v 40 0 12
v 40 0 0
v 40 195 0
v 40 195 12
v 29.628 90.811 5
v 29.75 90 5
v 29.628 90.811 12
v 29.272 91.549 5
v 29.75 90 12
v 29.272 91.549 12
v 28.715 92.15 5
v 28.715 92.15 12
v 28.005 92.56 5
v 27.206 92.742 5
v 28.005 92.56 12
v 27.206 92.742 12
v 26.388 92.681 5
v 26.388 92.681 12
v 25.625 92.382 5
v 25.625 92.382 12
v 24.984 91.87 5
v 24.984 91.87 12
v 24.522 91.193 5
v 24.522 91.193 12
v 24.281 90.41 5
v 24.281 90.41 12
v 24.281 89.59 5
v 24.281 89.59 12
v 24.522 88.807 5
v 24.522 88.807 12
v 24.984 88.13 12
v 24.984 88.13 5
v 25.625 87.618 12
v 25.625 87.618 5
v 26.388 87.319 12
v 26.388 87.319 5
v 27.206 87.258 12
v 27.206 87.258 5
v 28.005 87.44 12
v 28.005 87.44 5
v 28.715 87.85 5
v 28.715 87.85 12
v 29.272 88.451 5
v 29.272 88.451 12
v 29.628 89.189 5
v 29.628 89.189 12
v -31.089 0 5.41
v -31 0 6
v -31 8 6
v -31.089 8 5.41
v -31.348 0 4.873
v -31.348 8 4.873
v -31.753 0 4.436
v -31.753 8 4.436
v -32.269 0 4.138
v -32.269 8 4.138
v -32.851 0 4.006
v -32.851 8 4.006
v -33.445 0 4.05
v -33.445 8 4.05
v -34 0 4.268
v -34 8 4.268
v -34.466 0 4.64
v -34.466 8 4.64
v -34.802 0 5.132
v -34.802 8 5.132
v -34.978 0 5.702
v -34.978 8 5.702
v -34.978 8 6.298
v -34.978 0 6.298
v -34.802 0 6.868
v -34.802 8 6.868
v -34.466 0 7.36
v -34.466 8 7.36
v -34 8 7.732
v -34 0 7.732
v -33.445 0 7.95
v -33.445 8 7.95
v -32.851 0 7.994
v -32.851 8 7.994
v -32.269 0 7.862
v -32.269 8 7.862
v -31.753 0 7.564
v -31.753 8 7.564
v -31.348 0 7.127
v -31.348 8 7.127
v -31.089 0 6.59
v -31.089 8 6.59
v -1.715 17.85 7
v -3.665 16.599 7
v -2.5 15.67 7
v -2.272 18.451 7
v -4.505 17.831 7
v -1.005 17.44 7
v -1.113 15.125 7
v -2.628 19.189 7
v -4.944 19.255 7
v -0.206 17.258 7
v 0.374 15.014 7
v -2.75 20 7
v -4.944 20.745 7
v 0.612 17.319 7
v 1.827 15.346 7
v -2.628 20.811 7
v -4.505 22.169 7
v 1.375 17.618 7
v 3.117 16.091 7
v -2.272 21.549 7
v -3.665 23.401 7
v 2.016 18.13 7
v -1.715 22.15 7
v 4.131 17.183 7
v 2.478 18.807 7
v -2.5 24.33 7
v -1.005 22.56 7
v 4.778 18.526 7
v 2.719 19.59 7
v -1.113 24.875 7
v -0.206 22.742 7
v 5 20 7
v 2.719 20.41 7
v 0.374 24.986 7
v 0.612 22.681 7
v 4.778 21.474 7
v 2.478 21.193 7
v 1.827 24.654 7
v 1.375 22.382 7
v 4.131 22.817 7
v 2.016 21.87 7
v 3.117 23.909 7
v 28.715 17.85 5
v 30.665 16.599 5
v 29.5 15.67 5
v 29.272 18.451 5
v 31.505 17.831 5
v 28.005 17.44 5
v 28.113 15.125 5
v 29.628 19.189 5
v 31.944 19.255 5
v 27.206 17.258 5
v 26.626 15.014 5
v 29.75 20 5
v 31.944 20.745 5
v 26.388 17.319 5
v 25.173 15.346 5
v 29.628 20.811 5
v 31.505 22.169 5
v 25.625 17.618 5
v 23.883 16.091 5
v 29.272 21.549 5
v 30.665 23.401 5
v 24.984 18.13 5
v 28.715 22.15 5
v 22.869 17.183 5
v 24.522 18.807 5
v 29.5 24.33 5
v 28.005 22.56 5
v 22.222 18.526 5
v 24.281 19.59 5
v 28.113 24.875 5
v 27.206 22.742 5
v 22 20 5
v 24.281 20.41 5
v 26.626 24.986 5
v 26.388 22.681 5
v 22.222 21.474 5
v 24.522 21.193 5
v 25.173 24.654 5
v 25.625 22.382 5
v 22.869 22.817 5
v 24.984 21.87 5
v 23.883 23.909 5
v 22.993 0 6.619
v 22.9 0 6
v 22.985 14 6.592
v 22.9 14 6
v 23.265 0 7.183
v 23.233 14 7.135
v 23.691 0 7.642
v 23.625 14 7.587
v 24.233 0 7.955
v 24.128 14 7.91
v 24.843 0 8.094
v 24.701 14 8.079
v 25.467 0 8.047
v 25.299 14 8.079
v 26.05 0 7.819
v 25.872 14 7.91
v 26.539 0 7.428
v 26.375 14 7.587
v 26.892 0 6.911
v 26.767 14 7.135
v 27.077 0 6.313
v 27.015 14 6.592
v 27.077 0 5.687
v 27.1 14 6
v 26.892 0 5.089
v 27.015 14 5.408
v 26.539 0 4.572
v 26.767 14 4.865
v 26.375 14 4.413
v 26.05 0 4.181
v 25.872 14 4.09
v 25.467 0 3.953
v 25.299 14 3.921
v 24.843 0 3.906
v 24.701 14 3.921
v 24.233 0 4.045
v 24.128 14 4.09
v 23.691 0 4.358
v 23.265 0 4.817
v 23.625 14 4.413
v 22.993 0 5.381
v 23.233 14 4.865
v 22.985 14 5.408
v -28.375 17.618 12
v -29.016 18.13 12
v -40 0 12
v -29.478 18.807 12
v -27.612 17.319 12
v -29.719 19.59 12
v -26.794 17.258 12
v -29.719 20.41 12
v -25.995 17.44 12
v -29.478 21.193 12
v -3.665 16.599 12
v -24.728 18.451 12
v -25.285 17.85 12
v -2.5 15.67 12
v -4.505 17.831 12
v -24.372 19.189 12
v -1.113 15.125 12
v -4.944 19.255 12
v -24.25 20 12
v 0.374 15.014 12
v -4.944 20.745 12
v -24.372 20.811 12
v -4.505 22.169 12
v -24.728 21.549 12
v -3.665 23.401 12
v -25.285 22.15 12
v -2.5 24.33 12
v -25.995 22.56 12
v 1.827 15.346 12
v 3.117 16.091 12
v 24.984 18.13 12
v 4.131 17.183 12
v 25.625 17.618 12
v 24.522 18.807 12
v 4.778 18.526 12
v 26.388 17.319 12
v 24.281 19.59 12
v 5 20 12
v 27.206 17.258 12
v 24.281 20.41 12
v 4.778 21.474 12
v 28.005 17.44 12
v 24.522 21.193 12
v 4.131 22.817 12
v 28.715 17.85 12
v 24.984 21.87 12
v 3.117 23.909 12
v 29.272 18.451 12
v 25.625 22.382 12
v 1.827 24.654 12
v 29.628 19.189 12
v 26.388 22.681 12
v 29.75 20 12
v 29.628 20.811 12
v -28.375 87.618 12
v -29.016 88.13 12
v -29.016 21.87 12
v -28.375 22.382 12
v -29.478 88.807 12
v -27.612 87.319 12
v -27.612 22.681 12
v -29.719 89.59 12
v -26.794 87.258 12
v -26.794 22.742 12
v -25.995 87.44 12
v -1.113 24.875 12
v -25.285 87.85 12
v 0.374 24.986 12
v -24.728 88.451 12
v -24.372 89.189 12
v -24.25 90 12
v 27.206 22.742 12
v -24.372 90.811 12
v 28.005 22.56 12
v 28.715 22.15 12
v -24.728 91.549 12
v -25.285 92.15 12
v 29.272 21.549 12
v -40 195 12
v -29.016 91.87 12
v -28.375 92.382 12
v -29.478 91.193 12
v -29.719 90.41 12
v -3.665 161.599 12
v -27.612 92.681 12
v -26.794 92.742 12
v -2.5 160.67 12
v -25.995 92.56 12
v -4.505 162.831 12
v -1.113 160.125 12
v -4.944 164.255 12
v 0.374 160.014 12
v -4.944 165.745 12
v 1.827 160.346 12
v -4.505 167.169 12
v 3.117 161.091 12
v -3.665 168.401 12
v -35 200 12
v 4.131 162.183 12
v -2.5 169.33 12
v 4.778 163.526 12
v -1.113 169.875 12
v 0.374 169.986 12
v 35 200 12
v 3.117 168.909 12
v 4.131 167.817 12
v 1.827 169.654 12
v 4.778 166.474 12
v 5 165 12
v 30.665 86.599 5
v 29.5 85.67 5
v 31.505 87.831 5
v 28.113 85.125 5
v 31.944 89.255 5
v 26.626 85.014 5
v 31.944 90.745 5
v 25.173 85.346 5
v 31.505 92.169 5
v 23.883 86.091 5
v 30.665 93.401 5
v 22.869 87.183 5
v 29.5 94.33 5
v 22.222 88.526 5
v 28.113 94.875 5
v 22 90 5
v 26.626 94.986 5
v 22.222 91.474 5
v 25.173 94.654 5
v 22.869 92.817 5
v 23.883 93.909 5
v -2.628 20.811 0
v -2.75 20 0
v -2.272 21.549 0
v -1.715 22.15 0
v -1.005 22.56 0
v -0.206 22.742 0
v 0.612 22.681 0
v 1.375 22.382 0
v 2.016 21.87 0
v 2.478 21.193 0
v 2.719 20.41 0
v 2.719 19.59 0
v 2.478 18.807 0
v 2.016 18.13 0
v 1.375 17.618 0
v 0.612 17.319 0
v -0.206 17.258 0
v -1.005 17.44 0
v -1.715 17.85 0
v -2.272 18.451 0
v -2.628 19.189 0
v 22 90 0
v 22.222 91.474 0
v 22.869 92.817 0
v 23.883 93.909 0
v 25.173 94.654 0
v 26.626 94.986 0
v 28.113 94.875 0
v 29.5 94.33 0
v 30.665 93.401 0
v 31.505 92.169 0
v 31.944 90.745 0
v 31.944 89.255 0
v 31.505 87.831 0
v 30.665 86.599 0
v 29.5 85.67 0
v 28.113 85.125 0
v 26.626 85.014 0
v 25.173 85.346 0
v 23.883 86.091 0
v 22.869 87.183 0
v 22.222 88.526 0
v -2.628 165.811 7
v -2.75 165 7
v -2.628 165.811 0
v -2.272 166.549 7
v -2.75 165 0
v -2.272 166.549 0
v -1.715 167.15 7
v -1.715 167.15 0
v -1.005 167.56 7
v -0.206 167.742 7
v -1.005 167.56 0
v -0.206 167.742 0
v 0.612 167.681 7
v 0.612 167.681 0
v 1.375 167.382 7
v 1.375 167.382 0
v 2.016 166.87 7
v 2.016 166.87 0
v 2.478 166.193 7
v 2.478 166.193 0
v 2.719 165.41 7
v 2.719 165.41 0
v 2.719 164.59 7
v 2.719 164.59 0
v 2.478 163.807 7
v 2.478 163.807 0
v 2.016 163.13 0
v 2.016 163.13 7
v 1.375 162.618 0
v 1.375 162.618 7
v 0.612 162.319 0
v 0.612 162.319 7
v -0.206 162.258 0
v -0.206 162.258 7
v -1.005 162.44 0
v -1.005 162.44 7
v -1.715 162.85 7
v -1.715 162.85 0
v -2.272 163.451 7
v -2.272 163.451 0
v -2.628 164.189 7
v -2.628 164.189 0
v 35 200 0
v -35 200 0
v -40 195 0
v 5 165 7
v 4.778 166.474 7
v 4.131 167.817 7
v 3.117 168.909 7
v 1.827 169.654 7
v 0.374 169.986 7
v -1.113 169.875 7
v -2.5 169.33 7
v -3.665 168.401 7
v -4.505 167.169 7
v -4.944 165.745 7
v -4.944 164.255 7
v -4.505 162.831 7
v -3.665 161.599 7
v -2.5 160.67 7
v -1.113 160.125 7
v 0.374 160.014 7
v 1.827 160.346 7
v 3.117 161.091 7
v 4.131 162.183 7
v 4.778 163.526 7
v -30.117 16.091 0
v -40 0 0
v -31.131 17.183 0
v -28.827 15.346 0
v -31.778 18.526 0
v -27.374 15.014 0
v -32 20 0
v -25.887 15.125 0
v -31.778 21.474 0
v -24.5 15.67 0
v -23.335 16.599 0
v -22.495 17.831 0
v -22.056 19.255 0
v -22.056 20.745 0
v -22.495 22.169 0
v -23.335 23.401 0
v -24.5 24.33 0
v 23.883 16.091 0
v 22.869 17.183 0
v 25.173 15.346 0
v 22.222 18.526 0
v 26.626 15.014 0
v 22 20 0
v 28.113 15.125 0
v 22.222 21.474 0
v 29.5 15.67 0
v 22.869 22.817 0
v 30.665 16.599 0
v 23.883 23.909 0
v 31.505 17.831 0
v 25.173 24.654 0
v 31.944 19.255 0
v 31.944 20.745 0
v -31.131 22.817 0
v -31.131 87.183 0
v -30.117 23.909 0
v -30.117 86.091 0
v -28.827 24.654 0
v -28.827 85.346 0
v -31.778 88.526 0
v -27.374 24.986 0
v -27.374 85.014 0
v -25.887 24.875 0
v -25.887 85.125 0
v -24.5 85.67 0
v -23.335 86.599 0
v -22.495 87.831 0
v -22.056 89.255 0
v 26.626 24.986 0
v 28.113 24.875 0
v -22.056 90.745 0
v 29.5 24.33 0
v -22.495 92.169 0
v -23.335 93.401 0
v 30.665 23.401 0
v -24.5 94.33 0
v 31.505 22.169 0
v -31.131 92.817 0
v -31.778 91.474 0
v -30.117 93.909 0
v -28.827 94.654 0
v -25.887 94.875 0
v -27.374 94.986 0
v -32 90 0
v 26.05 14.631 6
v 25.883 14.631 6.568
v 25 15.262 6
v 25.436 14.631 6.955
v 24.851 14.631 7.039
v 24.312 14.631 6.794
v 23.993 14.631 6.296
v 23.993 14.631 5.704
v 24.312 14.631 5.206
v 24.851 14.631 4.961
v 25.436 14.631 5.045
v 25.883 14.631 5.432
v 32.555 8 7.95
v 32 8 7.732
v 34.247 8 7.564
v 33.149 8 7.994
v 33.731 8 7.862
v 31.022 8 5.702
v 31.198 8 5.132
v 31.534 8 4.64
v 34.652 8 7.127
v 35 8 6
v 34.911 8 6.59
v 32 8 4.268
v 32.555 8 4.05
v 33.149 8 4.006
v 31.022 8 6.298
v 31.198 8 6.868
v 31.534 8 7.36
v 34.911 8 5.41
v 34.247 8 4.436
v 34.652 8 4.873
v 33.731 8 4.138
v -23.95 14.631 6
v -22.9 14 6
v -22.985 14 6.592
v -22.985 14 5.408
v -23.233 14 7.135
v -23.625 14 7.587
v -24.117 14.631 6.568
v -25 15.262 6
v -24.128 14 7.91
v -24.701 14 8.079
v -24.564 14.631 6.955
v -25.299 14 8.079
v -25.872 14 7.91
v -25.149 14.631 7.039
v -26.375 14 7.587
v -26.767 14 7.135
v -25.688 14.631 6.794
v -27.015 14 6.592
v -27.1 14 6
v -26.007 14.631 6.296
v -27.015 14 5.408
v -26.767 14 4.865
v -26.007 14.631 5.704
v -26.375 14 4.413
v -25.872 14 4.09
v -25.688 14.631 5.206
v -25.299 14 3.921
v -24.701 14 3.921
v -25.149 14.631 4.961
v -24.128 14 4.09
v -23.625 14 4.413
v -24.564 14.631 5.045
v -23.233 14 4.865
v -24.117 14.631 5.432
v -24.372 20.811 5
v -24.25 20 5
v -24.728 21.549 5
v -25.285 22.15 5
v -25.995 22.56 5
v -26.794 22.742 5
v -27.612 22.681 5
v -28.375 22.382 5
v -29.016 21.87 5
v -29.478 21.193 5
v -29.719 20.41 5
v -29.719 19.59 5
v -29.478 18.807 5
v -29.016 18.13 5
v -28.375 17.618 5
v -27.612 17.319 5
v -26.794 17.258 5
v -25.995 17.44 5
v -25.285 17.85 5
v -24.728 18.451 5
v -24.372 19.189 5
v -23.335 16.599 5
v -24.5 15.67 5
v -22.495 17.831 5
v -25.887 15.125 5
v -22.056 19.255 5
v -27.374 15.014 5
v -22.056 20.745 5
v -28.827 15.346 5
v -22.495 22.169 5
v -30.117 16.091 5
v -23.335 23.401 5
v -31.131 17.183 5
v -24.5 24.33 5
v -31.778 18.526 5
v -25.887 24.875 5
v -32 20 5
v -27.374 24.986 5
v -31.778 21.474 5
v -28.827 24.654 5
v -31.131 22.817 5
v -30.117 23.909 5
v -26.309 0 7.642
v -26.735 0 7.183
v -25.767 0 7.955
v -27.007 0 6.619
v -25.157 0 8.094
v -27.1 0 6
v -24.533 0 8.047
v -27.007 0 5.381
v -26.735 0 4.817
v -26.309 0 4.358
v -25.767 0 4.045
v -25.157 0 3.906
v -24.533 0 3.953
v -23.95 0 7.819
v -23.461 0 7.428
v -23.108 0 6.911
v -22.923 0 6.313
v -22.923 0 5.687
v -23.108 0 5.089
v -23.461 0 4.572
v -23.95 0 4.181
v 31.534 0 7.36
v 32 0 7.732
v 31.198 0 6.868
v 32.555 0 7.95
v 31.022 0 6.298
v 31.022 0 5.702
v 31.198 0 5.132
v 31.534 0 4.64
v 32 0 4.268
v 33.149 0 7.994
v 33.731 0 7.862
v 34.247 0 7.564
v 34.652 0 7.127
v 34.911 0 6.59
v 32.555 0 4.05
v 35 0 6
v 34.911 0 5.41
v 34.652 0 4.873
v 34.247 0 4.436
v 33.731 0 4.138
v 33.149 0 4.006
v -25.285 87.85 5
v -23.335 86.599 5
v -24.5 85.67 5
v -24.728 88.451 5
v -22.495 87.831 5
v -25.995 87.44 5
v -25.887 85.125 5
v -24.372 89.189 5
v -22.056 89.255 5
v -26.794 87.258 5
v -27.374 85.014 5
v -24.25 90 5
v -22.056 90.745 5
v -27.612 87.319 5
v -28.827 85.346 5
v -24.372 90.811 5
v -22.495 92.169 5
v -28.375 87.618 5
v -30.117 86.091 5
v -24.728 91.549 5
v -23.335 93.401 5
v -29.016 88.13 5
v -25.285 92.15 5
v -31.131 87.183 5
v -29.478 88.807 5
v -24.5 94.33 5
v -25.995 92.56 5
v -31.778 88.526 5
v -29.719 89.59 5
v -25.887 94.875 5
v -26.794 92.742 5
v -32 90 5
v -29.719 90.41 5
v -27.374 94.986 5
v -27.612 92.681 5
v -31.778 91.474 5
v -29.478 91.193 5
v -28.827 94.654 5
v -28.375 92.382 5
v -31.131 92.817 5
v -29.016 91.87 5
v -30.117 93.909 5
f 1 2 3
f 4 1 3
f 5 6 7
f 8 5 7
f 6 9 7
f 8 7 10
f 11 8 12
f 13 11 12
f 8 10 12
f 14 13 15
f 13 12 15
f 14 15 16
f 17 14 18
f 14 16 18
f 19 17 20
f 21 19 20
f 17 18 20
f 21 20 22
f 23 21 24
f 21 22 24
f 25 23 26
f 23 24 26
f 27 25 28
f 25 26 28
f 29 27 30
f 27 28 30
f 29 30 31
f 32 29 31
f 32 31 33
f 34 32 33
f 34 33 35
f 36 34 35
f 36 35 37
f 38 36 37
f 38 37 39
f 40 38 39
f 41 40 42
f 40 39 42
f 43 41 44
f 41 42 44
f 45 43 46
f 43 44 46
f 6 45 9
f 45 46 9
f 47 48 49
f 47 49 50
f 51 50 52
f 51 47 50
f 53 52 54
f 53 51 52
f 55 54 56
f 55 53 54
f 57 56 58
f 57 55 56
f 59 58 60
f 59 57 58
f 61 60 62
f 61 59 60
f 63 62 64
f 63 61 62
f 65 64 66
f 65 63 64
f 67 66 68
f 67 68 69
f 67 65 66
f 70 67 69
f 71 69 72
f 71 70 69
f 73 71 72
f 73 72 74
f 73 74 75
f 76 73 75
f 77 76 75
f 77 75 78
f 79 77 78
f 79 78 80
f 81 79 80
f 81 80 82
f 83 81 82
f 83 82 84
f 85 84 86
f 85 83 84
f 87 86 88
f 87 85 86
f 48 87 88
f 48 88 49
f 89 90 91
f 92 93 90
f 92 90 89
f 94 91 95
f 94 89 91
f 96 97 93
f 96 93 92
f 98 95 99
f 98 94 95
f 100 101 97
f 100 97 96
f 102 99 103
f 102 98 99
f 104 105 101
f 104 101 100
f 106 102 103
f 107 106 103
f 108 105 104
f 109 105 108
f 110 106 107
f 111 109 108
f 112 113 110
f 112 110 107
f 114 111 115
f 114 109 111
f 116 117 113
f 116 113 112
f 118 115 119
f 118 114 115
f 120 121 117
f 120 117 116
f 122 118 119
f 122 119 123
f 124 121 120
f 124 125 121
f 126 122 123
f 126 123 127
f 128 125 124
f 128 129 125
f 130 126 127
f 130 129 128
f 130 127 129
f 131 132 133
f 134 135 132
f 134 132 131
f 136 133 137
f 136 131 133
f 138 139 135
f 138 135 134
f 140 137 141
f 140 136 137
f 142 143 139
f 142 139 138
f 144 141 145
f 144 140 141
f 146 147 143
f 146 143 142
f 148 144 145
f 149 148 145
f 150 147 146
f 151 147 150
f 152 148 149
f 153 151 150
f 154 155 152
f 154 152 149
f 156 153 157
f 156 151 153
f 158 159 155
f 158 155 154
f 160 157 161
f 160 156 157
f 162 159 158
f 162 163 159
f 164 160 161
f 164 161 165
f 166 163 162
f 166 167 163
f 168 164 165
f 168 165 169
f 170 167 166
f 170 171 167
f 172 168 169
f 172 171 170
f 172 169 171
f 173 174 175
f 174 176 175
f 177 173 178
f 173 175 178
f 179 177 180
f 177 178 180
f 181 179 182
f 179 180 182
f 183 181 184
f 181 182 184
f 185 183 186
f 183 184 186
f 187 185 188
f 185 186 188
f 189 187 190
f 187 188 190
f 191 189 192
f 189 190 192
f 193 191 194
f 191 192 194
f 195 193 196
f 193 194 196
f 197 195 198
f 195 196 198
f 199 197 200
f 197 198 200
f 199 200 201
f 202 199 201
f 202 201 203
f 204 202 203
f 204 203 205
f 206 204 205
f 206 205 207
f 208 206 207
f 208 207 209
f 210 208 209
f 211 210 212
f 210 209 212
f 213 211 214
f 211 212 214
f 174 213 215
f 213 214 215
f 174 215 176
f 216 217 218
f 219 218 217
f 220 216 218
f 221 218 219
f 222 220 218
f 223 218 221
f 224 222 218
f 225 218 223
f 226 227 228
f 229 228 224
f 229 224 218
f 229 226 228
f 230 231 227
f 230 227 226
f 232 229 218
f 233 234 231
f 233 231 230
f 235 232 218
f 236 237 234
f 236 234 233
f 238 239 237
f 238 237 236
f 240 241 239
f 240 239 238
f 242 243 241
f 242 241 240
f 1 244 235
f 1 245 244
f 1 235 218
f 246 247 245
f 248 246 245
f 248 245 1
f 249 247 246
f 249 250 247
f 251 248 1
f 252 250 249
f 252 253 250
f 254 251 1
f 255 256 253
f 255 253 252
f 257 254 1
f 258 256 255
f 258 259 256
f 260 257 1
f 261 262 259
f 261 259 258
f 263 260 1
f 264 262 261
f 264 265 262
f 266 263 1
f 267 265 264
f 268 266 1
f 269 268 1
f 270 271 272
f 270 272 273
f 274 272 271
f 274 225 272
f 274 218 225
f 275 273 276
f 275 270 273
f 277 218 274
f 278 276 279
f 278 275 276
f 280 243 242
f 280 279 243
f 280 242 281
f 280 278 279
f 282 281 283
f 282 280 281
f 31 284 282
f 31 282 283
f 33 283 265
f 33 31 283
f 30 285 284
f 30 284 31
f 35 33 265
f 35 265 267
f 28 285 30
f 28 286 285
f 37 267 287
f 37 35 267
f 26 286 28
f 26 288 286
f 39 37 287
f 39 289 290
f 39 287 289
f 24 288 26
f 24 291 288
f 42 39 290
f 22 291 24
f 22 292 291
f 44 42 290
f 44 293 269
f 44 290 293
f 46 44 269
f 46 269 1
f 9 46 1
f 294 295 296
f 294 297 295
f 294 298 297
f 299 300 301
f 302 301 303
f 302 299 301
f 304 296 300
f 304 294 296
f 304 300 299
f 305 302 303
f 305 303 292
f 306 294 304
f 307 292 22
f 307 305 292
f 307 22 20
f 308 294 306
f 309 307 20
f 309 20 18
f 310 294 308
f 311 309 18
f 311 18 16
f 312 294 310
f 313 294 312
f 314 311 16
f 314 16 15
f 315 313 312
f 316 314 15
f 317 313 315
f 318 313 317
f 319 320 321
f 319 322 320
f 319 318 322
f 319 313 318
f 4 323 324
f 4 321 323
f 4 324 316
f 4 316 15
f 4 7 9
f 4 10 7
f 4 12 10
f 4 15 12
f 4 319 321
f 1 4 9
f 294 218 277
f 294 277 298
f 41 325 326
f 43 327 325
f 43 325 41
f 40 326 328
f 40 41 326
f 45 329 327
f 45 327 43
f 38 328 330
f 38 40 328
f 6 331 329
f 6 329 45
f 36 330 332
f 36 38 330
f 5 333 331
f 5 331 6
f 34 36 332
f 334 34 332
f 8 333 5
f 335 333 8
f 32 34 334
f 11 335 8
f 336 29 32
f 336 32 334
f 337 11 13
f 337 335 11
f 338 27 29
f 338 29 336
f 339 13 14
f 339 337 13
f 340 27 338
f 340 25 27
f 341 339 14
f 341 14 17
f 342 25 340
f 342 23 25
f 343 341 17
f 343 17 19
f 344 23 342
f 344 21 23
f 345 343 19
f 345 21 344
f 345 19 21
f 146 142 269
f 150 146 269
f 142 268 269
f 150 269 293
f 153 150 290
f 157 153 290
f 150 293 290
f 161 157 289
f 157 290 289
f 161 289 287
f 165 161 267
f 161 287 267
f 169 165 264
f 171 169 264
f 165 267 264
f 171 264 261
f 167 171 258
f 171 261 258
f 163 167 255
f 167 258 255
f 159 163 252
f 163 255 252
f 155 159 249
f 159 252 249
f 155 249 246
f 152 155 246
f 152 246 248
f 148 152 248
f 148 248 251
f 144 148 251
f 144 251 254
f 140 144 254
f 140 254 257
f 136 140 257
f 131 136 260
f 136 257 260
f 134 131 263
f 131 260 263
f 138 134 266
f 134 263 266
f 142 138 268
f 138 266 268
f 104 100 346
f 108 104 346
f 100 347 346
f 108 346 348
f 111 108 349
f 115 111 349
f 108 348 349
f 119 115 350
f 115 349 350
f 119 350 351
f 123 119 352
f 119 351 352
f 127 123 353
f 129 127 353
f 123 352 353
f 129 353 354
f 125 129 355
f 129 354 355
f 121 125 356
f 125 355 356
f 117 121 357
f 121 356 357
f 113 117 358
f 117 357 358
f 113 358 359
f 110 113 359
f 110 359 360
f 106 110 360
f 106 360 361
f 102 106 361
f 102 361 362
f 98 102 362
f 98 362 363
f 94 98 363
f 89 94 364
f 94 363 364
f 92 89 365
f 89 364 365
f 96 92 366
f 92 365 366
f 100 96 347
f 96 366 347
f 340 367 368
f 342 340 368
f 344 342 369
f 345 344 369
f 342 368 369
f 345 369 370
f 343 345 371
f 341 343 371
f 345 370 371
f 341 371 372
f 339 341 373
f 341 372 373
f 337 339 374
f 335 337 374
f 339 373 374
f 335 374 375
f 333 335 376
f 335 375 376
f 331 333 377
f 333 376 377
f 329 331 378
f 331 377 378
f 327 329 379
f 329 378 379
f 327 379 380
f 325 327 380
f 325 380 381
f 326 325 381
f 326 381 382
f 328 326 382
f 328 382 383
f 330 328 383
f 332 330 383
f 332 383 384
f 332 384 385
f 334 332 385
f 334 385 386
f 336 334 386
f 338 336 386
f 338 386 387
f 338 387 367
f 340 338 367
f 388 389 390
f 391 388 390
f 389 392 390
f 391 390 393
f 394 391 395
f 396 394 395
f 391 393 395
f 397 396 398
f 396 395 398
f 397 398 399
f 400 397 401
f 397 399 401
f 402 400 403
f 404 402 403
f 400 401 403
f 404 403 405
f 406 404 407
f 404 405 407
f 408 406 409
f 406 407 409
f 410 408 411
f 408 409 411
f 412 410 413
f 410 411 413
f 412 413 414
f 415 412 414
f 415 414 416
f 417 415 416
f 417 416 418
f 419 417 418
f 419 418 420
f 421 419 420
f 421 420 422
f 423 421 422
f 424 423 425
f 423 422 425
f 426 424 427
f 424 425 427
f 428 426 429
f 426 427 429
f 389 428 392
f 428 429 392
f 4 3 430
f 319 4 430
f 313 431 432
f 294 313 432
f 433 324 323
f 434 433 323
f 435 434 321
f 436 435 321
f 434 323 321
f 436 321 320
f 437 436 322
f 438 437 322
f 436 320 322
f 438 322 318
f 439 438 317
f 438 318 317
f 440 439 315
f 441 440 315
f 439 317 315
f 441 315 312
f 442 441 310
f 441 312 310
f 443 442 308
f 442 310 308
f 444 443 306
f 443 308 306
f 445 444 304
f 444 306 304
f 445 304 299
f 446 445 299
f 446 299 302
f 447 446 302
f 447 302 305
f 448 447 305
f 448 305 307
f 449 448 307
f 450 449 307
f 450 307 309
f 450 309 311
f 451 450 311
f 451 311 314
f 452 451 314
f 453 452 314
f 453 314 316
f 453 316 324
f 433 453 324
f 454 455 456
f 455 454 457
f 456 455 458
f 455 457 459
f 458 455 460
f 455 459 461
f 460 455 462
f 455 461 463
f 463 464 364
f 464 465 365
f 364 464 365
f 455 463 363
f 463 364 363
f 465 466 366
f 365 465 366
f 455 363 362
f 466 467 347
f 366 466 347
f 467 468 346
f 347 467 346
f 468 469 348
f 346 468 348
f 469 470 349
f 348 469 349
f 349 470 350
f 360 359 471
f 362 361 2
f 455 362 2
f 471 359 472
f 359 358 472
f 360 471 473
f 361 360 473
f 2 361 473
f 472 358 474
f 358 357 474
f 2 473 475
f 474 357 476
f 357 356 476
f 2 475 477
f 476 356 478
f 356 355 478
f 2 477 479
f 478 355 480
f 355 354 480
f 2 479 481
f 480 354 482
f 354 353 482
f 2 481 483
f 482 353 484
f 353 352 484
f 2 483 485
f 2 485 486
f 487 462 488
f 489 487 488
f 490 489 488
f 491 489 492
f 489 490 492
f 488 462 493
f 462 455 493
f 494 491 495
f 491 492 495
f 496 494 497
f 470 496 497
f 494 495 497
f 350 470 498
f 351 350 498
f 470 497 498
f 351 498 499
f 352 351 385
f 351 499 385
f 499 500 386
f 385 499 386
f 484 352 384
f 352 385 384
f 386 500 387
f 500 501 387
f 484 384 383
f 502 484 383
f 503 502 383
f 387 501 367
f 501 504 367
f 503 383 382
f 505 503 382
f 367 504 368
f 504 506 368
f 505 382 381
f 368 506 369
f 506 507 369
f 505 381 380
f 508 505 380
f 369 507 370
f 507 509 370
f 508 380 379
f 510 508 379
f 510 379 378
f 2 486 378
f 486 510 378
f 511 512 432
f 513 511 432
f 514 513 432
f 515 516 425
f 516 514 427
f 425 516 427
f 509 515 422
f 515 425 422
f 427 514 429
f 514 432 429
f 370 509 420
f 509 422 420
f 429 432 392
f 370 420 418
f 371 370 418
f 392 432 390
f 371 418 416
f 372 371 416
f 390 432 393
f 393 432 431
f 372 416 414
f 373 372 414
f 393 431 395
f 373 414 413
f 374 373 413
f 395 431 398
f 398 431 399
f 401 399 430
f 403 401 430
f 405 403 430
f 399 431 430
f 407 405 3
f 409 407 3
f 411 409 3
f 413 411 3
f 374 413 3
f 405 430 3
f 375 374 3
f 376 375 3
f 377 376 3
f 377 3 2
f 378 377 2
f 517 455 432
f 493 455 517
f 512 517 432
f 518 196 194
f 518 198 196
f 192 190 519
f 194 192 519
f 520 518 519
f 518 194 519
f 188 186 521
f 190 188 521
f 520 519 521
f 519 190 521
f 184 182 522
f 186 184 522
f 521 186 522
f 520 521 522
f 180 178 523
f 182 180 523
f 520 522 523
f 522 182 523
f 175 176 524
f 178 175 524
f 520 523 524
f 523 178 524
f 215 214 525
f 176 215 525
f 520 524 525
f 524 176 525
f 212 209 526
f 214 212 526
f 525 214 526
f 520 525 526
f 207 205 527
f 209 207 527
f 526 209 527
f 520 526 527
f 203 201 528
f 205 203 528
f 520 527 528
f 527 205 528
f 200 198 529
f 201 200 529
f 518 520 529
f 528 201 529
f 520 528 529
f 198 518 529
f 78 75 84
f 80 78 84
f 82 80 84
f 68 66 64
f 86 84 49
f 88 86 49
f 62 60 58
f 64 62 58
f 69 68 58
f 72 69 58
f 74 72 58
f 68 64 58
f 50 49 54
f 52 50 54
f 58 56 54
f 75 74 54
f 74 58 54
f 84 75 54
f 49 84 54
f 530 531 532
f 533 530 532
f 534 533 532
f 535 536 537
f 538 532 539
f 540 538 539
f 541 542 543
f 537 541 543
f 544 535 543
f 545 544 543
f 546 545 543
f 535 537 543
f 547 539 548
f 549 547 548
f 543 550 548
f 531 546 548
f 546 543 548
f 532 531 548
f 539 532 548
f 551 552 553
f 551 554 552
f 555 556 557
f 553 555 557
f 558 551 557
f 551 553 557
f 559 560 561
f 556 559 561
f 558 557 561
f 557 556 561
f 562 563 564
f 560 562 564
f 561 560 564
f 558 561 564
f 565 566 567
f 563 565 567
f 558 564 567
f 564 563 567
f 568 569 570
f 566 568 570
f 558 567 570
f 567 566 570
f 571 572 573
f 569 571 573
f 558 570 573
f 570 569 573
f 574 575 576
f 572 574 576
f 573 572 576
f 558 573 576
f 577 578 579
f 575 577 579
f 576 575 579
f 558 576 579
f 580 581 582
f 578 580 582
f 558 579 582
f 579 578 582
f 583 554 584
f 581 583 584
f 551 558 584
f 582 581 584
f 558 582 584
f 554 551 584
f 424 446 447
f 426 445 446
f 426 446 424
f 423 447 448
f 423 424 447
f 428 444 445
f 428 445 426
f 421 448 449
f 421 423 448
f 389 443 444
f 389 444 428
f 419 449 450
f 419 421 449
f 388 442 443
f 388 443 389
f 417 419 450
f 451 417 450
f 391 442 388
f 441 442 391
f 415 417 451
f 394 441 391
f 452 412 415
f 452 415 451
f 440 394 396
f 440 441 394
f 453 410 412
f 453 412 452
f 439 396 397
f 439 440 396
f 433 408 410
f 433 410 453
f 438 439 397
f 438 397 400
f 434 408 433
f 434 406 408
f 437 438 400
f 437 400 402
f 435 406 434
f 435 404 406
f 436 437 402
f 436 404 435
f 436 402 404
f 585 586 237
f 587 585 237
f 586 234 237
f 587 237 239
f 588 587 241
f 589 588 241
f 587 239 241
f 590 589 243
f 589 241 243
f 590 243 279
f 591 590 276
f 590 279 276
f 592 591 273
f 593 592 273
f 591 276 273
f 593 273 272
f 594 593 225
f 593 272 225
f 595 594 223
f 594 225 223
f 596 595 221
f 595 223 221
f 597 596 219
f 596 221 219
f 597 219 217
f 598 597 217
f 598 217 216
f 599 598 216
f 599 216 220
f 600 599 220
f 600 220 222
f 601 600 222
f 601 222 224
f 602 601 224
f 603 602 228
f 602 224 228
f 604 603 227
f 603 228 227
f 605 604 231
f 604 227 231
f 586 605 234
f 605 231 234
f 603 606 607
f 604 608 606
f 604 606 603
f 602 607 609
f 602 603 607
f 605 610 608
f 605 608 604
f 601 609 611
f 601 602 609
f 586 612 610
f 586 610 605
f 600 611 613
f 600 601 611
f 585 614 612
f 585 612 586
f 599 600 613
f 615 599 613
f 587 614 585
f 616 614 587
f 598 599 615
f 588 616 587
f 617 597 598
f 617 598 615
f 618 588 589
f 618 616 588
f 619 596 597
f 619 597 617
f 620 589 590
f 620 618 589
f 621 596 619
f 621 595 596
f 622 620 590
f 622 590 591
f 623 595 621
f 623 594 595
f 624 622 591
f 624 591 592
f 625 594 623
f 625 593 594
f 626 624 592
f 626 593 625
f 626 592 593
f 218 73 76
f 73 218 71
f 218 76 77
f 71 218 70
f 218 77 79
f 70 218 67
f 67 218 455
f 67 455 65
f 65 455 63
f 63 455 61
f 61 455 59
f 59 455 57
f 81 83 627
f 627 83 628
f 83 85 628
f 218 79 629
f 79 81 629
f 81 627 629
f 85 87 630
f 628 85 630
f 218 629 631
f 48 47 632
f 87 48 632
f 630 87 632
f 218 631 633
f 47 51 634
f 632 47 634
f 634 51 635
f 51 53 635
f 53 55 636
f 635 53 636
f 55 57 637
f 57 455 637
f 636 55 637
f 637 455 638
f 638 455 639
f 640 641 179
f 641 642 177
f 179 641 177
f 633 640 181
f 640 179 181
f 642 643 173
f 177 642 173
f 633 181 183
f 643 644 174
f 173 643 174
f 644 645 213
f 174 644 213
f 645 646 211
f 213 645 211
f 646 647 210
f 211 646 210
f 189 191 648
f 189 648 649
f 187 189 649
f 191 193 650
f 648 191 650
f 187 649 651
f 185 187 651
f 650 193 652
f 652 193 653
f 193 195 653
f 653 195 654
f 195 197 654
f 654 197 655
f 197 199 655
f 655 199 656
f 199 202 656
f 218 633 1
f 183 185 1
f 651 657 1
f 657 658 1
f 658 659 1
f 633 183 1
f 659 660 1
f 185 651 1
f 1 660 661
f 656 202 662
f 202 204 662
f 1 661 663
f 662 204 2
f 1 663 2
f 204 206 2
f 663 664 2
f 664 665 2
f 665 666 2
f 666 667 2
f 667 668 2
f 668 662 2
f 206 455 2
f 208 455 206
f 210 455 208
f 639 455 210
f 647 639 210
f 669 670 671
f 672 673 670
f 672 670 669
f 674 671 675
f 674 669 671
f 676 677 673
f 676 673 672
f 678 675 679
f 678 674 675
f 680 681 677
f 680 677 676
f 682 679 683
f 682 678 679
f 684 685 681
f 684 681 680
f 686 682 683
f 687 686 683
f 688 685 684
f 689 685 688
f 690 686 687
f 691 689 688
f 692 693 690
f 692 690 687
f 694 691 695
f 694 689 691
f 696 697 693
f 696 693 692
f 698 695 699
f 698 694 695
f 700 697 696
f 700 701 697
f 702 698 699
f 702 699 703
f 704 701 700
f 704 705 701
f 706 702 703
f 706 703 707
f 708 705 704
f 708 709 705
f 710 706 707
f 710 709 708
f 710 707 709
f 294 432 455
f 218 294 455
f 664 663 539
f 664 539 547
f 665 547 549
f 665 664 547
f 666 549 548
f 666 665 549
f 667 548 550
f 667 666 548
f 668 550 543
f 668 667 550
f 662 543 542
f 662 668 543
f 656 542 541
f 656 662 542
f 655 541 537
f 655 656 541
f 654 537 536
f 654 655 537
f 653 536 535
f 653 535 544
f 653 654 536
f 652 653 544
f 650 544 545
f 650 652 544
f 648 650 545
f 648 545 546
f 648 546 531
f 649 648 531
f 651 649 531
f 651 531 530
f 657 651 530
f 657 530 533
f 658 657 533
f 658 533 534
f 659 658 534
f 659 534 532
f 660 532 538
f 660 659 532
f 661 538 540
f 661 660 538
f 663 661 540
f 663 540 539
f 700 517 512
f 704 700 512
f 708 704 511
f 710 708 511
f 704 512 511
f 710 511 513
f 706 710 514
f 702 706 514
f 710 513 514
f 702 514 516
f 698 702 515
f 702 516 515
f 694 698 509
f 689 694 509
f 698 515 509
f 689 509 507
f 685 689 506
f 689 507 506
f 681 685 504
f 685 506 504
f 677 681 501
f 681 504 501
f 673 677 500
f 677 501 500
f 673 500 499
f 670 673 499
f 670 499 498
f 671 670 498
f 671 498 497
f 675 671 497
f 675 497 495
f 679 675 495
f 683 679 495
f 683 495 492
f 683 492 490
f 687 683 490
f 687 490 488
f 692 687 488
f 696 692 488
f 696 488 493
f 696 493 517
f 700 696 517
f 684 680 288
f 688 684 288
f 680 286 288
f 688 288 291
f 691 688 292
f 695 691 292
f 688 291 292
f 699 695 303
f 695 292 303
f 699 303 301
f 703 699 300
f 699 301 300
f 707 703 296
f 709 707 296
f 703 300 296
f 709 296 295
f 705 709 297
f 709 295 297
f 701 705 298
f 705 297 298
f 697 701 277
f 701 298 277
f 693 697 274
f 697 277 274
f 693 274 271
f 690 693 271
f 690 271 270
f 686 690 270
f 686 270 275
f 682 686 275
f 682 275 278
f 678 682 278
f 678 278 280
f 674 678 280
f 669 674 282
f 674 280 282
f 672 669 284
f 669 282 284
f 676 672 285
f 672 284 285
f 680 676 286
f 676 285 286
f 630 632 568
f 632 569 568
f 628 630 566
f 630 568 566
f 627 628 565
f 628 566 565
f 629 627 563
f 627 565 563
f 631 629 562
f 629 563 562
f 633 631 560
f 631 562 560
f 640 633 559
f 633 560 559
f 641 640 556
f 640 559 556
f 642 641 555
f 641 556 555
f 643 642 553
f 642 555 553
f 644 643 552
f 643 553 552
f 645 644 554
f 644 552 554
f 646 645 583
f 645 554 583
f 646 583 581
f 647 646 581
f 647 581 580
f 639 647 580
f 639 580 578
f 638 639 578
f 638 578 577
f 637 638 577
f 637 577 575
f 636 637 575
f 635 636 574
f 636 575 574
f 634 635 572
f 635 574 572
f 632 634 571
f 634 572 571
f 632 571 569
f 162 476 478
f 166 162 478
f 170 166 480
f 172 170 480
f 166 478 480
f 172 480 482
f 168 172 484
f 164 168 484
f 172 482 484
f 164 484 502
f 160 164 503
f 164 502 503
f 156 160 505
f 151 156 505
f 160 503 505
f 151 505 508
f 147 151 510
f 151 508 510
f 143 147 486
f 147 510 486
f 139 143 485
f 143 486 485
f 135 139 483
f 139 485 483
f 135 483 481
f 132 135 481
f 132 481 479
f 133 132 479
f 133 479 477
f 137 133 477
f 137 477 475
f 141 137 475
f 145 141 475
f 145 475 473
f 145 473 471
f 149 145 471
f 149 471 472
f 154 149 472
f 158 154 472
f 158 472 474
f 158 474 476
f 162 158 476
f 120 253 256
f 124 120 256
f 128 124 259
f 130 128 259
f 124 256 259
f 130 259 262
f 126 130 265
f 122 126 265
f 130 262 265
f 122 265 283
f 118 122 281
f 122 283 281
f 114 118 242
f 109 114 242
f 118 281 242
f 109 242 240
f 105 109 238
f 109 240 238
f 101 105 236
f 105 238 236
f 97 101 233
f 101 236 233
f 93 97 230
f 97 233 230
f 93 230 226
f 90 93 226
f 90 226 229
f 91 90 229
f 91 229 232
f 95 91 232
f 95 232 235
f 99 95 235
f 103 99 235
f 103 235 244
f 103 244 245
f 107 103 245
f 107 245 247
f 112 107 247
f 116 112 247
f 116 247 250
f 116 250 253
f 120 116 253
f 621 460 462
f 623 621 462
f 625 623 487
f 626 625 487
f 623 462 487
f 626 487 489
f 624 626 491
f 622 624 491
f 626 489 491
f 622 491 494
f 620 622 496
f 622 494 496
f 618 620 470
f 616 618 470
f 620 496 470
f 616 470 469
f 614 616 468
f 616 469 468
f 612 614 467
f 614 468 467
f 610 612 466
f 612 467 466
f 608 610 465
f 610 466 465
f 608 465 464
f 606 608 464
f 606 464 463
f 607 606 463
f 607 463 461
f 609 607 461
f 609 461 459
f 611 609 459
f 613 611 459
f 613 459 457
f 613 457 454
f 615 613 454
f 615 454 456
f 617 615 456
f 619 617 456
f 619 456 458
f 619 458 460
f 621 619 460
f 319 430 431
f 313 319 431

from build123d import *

# Parameters (mm, degrees)
BOSS_EXTRUDE1_DEPTH                             = 12
CBORE_FOR_M5_SOCKET_HEAD_CAP_SCREW1_D           = 5.5
CBORE_FOR_M5_SOCKET_HEAD_CAP_SCREW1_CBORE_D     = 10
CBORE_FOR_M5_SOCKET_HEAD_CAP_SCREW1_CBORE_DEPTH = 5
M5X0_8_TAPPED_HOLE1_D                           = 4.2
M5X0_8_TAPPED_HOLE1_DEPTH                       = 14
M5X0_8_TAPPED_HOLE1_TIP                         = 1.2618073
SKETCH6_R                                       = 2
CUT_EXTRUDE1_DEPTH                              = 8
CBORE_FOR_M5_SOCKET_HEAD_CAP_SCREW2_D           = 5.5
CBORE_FOR_M5_SOCKET_HEAD_CAP_SCREW2_CBORE_D     = 10
CBORE_FOR_M5_SOCKET_HEAD_CAP_SCREW2_CBORE_DEPTH = 5


with BuildPart() as part:
    # Sketch1 → Boss-Extrude1 (new body)
    with BuildSketch(Plane.XY):
        Polygon((-40, 0), (40, 0), (40, 195), (35, 200), (-35, 200), (-40, 195), align=None)
    extrude(amount=BOSS_EXTRUDE1_DEPTH)

    # CBORE for M5 Socket Head Cap Screw1 (through all)
    with Locations(Plane.XY.offset(12)):
        with Locations((0, 20), (0, 165)):
            CounterBoreHole(CBORE_FOR_M5_SOCKET_HEAD_CAP_SCREW1_D / 2, CBORE_FOR_M5_SOCKET_HEAD_CAP_SCREW1_CBORE_D / 2, CBORE_FOR_M5_SOCKET_HEAD_CAP_SCREW1_CBORE_DEPTH)

    # M5x0.8 Tapped Hole1
    with Locations(Plane.XZ):
        with Locations((-25, 6), (25, 6)):
            Hole(M5X0_8_TAPPED_HOLE1_D / 2, depth=M5X0_8_TAPPED_HOLE1_DEPTH)
            with Locations((0, 0, -(M5X0_8_TAPPED_HOLE1_DEPTH + M5X0_8_TAPPED_HOLE1_TIP / 2))):  # 118° drill point
                Cone(0, M5X0_8_TAPPED_HOLE1_D / 2, M5X0_8_TAPPED_HOLE1_TIP, mode=Mode.SUBTRACT)

    # Sketch6 → Cut-Extrude1 (cut)
    with BuildSketch(Plane(origin=(0, 0, 0), x_dir=(1, 0, 0), z_dir=(0, 1, 0))):
        with Locations((33, -6)):
            Circle(SKETCH6_R)
        with Locations((-33, -6)):
            Circle(SKETCH6_R)
    extrude(amount=CUT_EXTRUDE1_DEPTH, mode=Mode.SUBTRACT)

    # CBORE for M5 Socket Head Cap Screw2 (through all)
    with Locations(Plane(origin=(0, 0, 0), x_dir=(-1, 0, 0), z_dir=(0, 0, -1))):
        with Locations((27, 20), (27, 90), (-27, 90), (-27, 20)):
            CounterBoreHole(CBORE_FOR_M5_SOCKET_HEAD_CAP_SCREW2_D / 2, CBORE_FOR_M5_SOCKET_HEAD_CAP_SCREW2_CBORE_D / 2, CBORE_FOR_M5_SOCKET_HEAD_CAP_SCREW2_CBORE_DEPTH)


solid = part.part
